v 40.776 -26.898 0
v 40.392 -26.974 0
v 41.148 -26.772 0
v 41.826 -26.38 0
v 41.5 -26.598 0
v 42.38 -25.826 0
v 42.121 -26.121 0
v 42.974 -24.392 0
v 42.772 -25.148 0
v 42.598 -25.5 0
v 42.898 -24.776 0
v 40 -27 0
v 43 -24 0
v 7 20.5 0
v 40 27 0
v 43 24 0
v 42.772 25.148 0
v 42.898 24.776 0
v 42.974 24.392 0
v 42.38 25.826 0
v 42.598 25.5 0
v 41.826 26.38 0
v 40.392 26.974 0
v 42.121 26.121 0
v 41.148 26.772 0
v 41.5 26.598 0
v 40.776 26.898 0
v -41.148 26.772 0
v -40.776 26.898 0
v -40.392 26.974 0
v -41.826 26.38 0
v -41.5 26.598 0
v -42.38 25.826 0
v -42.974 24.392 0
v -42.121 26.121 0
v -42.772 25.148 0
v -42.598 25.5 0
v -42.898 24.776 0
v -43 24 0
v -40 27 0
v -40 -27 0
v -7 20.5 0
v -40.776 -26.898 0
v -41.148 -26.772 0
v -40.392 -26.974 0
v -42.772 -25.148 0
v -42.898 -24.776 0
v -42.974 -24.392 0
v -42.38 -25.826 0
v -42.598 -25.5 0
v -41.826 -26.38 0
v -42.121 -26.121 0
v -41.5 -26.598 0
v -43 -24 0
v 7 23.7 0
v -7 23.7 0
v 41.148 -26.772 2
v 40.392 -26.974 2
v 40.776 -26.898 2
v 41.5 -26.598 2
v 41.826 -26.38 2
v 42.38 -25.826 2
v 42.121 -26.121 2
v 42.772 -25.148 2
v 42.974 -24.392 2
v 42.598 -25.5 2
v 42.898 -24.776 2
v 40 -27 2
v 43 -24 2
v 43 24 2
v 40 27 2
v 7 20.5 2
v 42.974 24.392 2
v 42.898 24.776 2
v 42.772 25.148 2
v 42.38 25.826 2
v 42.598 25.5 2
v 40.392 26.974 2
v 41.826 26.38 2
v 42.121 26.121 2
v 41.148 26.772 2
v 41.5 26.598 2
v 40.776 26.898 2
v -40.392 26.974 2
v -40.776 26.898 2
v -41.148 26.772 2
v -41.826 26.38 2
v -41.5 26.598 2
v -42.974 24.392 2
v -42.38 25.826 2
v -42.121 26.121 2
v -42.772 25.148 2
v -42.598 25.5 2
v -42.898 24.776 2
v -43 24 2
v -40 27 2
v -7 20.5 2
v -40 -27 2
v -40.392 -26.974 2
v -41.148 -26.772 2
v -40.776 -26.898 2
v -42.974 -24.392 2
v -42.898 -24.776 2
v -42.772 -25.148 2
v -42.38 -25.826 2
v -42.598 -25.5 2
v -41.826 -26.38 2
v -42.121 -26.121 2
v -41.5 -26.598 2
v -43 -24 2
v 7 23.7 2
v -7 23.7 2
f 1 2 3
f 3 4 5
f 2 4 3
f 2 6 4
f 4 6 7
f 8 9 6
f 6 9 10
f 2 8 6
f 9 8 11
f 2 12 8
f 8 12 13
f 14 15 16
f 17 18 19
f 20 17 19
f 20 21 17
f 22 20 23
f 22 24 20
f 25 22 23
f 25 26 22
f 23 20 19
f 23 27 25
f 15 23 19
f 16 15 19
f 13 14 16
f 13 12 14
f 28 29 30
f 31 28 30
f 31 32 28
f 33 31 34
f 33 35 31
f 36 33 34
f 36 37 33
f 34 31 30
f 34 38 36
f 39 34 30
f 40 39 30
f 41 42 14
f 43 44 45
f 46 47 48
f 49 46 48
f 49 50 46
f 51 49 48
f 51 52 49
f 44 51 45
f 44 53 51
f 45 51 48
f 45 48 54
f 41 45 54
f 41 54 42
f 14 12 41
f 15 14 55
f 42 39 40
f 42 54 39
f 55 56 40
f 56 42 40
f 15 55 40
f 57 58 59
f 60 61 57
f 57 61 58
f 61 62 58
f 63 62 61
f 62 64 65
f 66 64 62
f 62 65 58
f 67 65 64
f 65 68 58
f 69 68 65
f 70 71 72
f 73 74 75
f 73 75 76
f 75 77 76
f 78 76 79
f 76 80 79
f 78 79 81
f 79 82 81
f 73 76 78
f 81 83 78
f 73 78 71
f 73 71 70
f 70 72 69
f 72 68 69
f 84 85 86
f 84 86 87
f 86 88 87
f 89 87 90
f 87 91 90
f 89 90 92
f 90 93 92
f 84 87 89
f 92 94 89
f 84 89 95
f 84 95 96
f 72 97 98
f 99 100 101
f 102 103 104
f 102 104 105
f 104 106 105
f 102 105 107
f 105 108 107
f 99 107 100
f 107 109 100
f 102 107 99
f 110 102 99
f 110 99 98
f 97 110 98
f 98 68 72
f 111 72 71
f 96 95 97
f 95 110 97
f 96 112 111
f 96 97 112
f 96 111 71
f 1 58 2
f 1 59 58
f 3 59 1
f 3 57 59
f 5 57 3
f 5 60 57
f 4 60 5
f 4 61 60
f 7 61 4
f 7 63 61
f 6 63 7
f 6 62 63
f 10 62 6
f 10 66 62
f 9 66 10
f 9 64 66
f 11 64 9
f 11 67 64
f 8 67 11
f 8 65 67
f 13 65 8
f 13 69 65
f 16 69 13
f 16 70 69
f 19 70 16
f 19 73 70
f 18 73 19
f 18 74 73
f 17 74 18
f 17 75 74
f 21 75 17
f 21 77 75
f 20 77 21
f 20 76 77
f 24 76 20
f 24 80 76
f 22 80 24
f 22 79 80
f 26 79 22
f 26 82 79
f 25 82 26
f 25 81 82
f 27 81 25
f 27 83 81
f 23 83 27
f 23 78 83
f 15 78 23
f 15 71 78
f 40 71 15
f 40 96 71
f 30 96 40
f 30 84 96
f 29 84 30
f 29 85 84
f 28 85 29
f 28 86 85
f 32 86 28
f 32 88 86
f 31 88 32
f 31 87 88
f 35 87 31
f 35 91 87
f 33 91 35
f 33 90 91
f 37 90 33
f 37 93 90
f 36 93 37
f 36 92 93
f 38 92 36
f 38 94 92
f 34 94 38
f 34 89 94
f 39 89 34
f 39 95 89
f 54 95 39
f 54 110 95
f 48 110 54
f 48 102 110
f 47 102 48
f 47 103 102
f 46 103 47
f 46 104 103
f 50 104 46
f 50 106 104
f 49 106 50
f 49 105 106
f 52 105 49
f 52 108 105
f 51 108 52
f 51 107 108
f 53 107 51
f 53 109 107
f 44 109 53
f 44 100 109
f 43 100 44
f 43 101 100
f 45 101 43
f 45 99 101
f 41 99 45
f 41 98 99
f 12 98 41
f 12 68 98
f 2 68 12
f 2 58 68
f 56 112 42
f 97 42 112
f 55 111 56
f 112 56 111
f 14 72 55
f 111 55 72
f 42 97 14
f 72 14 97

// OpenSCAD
// Crachá — modelo próprio do Multiferramenta 3D (tamanho de cartão, 86 × 54 mm)
// Partes: "base" e "texto"
nome = "Rafael Roman"; cargo = "Gerente"; empresa = "Multiferramenta 3D"; fonte = "Poppins:style=Bold";
orientacao = "horizontal";   // horizontal | vertical
esp = 2; relevo = 0.8; raio = 3; prendedor = "rasgo";   // rasgo (presilha/jacaré) | furo (cordão)
parte = "base";
$fn = 48;

L = orientacao == "vertical" ? 54 : 86; A = orientacao == "vertical" ? 86 : 54;
topo_util = A / 2 - (prendedor == "rasgo" ? 9 : 8);       // abaixo do rasgo
module cartao() offset(r = raio) offset(delta = -raio) square([L, A], center = true);
module furo() { if (prendedor == "rasgo") translate([-7, A / 2 - 6.5]) square([14, 3.2]); else translate([0, A / 2 - 5]) circle(d = 4.5); }
module linha(t, y, h, wmax) if (len(t) > 0) translate([0, y]) resize([min(wmax, len(t) * h * 0.72), 0], auto = true) text(t, font = fonte, size = h, halign = "center", valign = "center");
module textos() {
  linha(empresa, topo_util - 5, 5, L - 12);
  linha(nome, orientacao == "vertical" ? 0 : -3, 8, L - 10);
  linha(cargo, orientacao == "vertical" ? -12 : -14, 5.5, L - 14);
  translate([0, topo_util - 10.5]) square([L - 16, 0.8], center = true);      // filete abaixo da empresa
}
if (parte == "base") linear_extrude(esp) difference() { cartao(); furo(); }
else if (parte == "texto") translate([0, 0, esp]) linear_extrude(relevo) textos();
